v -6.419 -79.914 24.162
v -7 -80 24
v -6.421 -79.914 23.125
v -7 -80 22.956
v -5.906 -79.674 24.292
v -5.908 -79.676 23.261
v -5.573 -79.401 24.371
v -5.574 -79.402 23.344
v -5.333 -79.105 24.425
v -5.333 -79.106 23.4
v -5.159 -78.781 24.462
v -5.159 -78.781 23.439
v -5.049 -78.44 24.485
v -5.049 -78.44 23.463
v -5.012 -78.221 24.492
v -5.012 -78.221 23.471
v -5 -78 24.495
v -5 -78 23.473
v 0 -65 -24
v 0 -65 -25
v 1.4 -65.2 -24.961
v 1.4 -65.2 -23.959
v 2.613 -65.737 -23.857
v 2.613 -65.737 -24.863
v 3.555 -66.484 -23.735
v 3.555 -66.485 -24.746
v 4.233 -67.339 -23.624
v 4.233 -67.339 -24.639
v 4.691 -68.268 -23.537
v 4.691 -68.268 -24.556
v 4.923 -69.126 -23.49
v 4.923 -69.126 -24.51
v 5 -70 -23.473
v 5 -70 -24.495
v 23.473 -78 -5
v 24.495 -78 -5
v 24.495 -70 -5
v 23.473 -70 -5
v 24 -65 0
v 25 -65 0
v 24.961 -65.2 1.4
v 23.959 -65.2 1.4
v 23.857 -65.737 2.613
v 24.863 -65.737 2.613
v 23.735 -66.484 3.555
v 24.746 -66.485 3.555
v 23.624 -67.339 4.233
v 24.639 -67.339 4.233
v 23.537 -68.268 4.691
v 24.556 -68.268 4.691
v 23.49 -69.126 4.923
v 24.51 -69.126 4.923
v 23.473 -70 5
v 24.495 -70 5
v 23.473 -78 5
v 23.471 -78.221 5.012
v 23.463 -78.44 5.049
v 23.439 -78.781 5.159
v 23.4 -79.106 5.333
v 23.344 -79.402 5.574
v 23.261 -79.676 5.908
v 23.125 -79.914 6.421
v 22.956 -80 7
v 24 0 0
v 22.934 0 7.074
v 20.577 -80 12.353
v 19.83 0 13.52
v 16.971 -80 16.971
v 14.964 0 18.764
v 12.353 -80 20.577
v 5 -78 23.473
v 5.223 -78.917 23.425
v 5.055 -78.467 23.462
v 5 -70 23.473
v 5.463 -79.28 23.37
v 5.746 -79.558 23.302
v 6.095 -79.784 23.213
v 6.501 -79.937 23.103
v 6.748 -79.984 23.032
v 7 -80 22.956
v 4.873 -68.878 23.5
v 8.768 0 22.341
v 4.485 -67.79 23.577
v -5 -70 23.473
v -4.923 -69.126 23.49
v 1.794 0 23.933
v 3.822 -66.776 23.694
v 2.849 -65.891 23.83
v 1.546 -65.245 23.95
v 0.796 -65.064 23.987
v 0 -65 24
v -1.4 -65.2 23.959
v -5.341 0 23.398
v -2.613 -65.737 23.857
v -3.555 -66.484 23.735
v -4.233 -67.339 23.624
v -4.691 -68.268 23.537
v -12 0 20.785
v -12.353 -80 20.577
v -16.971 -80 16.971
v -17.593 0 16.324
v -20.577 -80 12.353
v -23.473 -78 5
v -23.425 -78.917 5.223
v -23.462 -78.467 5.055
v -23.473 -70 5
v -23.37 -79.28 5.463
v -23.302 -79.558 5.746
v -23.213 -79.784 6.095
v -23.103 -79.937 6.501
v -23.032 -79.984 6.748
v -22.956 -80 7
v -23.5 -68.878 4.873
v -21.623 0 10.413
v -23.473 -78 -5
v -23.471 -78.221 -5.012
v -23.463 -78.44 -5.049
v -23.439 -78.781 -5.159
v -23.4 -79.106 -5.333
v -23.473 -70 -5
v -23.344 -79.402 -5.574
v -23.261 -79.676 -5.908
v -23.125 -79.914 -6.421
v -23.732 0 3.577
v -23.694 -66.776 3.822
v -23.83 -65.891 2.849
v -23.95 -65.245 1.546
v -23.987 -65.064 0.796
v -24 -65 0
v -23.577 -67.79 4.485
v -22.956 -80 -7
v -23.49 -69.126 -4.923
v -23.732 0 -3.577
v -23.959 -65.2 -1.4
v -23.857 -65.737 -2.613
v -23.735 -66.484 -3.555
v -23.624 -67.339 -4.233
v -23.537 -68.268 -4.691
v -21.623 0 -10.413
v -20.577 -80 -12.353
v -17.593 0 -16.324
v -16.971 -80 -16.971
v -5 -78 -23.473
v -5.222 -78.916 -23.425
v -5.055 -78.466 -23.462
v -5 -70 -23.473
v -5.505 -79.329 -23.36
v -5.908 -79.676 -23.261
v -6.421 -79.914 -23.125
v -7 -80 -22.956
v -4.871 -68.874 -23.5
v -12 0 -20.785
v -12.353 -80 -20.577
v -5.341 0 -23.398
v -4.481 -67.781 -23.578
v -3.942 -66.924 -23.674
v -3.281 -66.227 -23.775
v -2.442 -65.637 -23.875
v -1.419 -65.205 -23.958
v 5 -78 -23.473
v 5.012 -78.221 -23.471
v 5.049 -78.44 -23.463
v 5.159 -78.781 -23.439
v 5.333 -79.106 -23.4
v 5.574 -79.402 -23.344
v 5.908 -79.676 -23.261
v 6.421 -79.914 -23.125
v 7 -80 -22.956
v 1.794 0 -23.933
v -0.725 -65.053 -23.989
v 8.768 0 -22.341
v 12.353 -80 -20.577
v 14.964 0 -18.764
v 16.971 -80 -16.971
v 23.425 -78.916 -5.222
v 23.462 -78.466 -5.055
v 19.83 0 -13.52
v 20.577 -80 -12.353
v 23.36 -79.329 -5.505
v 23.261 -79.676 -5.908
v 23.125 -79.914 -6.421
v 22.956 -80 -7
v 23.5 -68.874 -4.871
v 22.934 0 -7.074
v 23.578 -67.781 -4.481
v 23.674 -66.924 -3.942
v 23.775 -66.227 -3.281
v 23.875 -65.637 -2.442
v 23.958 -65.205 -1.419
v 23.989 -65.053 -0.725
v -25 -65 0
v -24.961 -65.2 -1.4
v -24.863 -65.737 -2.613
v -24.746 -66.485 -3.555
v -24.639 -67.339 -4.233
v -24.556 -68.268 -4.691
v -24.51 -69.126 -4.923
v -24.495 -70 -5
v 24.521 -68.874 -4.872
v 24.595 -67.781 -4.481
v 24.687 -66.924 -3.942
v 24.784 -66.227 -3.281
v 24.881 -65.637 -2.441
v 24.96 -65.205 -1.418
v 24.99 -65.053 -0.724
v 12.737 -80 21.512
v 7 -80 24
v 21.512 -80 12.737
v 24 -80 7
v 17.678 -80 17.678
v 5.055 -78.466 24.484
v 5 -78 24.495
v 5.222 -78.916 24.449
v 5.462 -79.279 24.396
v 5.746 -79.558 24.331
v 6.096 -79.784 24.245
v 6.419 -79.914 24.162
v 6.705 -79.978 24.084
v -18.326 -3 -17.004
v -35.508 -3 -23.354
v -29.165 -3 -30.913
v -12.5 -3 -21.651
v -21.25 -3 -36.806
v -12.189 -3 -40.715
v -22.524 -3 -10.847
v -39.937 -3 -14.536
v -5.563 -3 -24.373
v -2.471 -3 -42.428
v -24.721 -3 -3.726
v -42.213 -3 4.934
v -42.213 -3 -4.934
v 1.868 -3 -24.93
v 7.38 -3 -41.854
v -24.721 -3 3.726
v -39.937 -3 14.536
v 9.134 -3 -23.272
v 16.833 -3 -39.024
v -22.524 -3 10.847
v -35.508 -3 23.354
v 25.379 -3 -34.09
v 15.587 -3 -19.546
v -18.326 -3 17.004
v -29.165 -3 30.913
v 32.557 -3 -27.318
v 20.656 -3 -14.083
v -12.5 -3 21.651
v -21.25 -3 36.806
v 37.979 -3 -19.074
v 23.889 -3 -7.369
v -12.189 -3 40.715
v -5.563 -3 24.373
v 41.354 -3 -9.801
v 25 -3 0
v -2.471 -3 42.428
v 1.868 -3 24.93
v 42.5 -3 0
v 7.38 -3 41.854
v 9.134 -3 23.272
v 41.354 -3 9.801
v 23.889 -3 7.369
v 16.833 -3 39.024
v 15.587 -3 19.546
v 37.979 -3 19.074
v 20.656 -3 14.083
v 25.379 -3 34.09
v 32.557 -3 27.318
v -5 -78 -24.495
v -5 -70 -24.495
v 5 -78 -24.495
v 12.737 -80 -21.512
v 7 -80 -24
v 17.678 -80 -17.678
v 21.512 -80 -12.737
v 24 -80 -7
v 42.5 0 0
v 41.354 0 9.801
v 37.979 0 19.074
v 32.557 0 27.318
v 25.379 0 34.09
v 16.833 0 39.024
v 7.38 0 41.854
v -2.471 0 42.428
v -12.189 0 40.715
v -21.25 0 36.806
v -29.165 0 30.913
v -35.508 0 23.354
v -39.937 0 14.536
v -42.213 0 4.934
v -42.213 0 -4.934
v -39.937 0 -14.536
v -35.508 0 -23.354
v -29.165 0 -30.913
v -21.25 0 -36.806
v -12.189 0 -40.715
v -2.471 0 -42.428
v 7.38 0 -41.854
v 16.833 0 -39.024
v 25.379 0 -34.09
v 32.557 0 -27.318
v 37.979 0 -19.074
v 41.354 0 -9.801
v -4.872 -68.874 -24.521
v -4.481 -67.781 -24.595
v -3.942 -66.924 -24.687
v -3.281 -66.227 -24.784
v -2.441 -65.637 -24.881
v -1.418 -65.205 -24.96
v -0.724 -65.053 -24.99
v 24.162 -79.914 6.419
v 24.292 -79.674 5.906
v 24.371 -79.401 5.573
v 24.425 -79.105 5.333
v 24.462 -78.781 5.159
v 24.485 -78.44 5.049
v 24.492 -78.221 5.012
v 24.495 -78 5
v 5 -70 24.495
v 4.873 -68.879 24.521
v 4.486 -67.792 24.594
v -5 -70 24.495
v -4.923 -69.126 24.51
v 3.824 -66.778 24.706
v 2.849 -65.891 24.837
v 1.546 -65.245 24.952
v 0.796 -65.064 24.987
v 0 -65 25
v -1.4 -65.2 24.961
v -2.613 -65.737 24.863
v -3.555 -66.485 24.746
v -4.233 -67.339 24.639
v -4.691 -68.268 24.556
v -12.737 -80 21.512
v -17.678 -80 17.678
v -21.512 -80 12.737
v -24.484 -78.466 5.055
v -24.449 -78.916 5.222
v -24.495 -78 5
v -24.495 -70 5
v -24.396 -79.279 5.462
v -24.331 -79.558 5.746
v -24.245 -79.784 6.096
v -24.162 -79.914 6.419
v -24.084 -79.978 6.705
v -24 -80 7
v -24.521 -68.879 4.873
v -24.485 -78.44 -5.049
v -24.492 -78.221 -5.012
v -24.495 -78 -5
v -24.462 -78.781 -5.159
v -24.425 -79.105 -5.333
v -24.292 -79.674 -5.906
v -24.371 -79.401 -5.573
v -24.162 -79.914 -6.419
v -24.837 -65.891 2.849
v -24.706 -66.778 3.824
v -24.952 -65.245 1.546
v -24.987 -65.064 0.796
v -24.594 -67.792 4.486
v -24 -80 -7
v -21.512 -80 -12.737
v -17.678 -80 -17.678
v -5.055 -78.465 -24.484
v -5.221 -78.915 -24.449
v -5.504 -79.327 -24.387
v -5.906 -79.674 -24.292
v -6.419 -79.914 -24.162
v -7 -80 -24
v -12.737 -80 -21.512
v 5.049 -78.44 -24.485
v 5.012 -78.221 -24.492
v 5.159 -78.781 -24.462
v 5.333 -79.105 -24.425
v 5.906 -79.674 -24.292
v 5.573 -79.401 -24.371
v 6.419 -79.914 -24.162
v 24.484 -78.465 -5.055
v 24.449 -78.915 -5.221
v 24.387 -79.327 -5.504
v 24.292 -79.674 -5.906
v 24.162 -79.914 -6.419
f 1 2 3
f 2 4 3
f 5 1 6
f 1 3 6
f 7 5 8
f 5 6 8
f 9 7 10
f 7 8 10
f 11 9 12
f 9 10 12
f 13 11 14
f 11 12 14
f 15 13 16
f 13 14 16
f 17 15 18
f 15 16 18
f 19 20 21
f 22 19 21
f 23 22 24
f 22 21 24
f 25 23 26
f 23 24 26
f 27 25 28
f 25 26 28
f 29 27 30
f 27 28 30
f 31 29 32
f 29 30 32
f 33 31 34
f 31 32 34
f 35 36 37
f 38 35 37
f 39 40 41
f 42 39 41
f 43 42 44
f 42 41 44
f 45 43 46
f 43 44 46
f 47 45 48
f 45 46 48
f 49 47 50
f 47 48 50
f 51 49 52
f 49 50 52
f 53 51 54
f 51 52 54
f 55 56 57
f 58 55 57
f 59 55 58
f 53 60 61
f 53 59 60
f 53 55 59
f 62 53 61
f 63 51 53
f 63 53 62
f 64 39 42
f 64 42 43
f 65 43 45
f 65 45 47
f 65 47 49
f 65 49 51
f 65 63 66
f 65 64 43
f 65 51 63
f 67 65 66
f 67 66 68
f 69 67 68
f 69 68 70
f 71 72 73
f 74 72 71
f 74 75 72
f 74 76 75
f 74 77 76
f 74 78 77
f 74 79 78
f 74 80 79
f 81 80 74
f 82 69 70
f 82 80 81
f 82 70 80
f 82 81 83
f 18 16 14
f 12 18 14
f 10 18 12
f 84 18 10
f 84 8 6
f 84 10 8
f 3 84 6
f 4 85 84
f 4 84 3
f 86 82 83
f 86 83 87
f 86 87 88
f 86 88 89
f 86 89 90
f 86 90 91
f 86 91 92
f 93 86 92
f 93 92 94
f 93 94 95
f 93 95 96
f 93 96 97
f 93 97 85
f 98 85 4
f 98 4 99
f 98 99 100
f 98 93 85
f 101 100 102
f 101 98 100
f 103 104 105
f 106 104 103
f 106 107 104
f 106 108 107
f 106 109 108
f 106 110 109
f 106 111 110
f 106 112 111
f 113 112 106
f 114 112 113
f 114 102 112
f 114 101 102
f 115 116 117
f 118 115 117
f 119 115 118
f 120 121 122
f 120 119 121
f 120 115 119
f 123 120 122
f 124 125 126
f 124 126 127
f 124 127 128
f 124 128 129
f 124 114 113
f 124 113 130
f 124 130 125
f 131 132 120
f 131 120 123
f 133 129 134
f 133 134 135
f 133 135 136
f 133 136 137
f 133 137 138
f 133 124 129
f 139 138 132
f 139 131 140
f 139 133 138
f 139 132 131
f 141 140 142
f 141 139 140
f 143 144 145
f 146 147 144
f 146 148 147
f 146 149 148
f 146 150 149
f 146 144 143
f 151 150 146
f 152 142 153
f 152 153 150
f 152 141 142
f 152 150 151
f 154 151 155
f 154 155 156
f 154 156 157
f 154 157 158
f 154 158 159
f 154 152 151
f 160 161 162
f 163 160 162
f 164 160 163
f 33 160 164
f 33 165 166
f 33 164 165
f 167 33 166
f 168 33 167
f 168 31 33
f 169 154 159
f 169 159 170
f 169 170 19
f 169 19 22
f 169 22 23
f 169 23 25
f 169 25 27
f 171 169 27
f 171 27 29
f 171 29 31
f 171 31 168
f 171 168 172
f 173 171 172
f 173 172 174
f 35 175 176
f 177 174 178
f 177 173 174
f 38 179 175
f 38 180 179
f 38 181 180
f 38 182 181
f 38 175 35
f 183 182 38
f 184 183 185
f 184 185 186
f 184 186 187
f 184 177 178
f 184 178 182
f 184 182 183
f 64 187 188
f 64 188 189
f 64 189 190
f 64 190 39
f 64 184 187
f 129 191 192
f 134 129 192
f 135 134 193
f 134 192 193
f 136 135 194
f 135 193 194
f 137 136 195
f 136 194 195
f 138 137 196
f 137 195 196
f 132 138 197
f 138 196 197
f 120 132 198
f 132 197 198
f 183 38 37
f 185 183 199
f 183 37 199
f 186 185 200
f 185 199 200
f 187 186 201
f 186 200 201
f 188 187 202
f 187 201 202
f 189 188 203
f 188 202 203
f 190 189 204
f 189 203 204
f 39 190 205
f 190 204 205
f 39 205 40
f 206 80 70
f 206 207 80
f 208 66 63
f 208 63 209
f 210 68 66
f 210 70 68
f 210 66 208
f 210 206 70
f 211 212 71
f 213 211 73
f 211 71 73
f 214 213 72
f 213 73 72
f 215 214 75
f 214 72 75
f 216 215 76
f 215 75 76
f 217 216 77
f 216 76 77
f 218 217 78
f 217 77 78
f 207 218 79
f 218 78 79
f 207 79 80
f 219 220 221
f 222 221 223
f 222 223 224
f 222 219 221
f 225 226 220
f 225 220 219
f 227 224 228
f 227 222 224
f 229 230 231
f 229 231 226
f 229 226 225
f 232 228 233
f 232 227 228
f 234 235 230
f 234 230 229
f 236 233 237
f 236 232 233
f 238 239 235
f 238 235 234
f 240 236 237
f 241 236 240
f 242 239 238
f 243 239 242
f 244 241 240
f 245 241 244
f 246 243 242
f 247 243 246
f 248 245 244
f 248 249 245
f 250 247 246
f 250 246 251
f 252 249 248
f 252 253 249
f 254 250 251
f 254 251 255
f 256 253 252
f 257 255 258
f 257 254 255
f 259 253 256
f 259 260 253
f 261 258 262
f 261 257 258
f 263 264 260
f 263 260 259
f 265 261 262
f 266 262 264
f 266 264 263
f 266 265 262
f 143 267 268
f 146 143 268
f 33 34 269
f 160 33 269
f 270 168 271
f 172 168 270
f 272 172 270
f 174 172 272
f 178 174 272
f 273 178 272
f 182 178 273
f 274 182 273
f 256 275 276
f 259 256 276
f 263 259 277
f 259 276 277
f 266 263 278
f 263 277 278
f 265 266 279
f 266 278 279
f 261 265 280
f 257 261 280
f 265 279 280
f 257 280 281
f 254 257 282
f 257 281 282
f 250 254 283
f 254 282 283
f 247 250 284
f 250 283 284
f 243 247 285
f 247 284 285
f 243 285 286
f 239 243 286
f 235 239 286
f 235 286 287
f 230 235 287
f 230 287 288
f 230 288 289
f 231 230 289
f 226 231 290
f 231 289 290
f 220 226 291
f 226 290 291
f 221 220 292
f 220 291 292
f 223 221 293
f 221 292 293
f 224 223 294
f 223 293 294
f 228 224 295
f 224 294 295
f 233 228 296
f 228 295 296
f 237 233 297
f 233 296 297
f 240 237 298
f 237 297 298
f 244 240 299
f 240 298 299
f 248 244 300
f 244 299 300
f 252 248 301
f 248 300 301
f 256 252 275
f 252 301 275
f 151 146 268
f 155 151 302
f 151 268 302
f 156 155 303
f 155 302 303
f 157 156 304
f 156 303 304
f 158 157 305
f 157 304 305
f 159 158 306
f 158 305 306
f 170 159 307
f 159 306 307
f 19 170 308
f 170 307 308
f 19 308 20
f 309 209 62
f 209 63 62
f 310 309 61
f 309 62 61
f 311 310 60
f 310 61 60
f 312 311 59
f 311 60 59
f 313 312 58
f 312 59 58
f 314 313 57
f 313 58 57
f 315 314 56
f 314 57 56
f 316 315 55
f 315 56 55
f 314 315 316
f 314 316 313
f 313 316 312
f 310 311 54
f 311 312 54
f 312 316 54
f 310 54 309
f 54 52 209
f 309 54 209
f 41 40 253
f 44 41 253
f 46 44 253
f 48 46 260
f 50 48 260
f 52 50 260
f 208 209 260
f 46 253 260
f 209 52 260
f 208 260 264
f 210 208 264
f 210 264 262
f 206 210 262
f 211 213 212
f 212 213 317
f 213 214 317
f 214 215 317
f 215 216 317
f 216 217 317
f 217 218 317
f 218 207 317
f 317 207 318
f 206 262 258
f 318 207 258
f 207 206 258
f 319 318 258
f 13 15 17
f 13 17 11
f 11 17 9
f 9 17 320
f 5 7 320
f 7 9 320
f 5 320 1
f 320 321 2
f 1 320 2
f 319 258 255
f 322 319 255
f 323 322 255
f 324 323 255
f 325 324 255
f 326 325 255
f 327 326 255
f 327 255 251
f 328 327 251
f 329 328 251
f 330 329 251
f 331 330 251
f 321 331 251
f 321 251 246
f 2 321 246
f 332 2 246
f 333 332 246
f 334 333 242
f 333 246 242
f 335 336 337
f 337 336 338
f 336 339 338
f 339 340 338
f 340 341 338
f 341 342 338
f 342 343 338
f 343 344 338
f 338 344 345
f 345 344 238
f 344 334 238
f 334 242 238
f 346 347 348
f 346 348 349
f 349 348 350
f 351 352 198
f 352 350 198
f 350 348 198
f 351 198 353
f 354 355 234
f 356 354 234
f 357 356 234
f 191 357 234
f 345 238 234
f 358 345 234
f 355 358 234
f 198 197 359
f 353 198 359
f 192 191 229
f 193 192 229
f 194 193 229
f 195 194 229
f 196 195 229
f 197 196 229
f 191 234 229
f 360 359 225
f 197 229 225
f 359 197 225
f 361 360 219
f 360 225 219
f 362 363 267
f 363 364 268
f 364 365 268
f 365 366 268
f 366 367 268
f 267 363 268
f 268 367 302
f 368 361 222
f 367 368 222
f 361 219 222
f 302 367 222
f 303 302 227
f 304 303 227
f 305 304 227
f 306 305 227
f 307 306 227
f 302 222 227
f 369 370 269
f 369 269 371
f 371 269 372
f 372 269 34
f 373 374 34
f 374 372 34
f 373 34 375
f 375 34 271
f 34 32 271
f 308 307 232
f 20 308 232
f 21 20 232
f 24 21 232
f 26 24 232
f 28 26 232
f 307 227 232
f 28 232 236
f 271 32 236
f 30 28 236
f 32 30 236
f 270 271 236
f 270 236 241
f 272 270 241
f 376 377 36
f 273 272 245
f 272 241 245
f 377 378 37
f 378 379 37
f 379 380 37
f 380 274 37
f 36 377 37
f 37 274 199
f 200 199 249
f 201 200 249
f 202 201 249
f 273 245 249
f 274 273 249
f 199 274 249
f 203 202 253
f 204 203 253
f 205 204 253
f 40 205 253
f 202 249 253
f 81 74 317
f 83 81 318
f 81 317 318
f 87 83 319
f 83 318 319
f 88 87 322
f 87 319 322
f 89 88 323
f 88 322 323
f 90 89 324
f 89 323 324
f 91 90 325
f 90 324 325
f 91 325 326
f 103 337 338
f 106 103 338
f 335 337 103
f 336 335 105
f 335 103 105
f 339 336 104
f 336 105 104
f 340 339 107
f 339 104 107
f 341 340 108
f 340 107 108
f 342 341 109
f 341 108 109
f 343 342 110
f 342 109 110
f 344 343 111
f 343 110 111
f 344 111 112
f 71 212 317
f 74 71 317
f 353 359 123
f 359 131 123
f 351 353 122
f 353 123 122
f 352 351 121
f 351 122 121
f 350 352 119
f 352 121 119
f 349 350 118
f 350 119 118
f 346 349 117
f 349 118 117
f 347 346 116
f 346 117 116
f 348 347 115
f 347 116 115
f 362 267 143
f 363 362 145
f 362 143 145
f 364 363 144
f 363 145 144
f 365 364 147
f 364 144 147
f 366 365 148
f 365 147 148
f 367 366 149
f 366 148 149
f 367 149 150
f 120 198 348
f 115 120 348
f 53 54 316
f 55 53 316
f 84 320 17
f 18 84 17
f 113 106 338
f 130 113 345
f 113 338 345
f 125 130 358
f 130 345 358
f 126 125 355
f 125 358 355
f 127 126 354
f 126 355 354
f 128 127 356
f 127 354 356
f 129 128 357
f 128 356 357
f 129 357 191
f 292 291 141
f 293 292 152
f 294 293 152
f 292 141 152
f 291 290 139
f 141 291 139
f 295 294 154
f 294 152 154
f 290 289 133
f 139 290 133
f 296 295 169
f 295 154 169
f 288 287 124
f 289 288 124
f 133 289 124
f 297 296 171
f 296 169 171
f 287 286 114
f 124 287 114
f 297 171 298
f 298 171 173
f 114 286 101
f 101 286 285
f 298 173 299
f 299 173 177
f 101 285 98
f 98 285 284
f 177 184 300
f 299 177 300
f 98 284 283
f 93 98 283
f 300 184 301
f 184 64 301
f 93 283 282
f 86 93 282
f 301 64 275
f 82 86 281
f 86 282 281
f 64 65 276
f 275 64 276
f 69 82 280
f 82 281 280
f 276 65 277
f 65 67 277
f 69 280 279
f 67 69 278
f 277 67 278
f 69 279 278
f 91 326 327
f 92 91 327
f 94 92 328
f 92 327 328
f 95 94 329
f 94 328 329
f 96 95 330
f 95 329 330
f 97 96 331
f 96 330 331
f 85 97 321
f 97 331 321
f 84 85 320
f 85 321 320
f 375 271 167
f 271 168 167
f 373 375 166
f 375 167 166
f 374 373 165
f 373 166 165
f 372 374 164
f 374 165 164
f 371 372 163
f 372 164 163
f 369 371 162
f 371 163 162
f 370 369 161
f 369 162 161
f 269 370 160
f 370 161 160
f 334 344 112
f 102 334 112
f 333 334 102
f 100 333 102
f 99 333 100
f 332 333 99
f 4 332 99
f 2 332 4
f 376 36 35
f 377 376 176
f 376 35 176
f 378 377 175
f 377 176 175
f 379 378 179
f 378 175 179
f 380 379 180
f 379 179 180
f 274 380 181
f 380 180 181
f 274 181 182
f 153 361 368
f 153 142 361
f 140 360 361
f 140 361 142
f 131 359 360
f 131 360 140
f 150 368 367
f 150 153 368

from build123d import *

# Parameters (mm, degrees)
F0_R     = 42.5
F0_R_2   = 25
F1_DEPTH = 3
F0_R_3   = 24
F3_DEPTH = 80
F5_DEPTH = 2
F6_COUNT = 4
F7_R     = 2


with BuildPart() as f1:
    # F0 (on Front) → F1 (new body)
    with BuildSketch(Plane.XZ):
        Circle(F0_R)
        Circle(F0_R_2, mode=Mode.SUBTRACT)
    extrude(amount=F1_DEPTH)

    # F0 (on Front) → F3 (join)
    with BuildSketch(Plane.XZ):
        Circle(F0_R_2)
        Circle(F0_R_3, mode=Mode.SUBTRACT)
    extrude(amount=F3_DEPTH)

    # F6: F5 ×4 about axis
    f6_axis = Axis((0, -80, 0), (0, -1, 0))


with BuildPart() as f5:
    # F4 (on offset) → F5 (new body)
    with BuildSketch(Plane.XY.offset(25)):
        with BuildLine():
            Line((-5, -70), (-5, -80))
            Line((-5, -80), (5, -80))
            Line((5, -80), (5, -70))
            ThreePointArc((5, -70), (3.5355339059, -66.4644660941), (0, -65))
            ThreePointArc((0, -65), (-3.5355339059, -66.4644660941), (-5, -70))
        make_face()
    extrude(amount=-F5_DEPTH)


with BuildPart() as f1_1:
    add(f1.part)
    for i in range(1, F6_COUNT):
        add(f5.part.rotate(f6_axis, i * 360 / F6_COUNT), mode=Mode.SUBTRACT)

    # F6#seed: cut F5
    add(f5.part, mode=Mode.SUBTRACT)

    # F7
    f7_edges = [f1_1.edges().sort_by_distance(p)[0] for p in [
        (5, -80, -23.984143),
        (-5, -80, -23.984143),
        (23.984143, -80, -5),
        (23.984143, -80, 5),
        (5, -80, 23.984143),
        (-5, -80, 23.984143),
        (-23.984143, -80, -5),
        (-23.984143, -80, 5),
    ]]
    fillet(f7_edges, radius=F7_R)


solid = f1_1.part
